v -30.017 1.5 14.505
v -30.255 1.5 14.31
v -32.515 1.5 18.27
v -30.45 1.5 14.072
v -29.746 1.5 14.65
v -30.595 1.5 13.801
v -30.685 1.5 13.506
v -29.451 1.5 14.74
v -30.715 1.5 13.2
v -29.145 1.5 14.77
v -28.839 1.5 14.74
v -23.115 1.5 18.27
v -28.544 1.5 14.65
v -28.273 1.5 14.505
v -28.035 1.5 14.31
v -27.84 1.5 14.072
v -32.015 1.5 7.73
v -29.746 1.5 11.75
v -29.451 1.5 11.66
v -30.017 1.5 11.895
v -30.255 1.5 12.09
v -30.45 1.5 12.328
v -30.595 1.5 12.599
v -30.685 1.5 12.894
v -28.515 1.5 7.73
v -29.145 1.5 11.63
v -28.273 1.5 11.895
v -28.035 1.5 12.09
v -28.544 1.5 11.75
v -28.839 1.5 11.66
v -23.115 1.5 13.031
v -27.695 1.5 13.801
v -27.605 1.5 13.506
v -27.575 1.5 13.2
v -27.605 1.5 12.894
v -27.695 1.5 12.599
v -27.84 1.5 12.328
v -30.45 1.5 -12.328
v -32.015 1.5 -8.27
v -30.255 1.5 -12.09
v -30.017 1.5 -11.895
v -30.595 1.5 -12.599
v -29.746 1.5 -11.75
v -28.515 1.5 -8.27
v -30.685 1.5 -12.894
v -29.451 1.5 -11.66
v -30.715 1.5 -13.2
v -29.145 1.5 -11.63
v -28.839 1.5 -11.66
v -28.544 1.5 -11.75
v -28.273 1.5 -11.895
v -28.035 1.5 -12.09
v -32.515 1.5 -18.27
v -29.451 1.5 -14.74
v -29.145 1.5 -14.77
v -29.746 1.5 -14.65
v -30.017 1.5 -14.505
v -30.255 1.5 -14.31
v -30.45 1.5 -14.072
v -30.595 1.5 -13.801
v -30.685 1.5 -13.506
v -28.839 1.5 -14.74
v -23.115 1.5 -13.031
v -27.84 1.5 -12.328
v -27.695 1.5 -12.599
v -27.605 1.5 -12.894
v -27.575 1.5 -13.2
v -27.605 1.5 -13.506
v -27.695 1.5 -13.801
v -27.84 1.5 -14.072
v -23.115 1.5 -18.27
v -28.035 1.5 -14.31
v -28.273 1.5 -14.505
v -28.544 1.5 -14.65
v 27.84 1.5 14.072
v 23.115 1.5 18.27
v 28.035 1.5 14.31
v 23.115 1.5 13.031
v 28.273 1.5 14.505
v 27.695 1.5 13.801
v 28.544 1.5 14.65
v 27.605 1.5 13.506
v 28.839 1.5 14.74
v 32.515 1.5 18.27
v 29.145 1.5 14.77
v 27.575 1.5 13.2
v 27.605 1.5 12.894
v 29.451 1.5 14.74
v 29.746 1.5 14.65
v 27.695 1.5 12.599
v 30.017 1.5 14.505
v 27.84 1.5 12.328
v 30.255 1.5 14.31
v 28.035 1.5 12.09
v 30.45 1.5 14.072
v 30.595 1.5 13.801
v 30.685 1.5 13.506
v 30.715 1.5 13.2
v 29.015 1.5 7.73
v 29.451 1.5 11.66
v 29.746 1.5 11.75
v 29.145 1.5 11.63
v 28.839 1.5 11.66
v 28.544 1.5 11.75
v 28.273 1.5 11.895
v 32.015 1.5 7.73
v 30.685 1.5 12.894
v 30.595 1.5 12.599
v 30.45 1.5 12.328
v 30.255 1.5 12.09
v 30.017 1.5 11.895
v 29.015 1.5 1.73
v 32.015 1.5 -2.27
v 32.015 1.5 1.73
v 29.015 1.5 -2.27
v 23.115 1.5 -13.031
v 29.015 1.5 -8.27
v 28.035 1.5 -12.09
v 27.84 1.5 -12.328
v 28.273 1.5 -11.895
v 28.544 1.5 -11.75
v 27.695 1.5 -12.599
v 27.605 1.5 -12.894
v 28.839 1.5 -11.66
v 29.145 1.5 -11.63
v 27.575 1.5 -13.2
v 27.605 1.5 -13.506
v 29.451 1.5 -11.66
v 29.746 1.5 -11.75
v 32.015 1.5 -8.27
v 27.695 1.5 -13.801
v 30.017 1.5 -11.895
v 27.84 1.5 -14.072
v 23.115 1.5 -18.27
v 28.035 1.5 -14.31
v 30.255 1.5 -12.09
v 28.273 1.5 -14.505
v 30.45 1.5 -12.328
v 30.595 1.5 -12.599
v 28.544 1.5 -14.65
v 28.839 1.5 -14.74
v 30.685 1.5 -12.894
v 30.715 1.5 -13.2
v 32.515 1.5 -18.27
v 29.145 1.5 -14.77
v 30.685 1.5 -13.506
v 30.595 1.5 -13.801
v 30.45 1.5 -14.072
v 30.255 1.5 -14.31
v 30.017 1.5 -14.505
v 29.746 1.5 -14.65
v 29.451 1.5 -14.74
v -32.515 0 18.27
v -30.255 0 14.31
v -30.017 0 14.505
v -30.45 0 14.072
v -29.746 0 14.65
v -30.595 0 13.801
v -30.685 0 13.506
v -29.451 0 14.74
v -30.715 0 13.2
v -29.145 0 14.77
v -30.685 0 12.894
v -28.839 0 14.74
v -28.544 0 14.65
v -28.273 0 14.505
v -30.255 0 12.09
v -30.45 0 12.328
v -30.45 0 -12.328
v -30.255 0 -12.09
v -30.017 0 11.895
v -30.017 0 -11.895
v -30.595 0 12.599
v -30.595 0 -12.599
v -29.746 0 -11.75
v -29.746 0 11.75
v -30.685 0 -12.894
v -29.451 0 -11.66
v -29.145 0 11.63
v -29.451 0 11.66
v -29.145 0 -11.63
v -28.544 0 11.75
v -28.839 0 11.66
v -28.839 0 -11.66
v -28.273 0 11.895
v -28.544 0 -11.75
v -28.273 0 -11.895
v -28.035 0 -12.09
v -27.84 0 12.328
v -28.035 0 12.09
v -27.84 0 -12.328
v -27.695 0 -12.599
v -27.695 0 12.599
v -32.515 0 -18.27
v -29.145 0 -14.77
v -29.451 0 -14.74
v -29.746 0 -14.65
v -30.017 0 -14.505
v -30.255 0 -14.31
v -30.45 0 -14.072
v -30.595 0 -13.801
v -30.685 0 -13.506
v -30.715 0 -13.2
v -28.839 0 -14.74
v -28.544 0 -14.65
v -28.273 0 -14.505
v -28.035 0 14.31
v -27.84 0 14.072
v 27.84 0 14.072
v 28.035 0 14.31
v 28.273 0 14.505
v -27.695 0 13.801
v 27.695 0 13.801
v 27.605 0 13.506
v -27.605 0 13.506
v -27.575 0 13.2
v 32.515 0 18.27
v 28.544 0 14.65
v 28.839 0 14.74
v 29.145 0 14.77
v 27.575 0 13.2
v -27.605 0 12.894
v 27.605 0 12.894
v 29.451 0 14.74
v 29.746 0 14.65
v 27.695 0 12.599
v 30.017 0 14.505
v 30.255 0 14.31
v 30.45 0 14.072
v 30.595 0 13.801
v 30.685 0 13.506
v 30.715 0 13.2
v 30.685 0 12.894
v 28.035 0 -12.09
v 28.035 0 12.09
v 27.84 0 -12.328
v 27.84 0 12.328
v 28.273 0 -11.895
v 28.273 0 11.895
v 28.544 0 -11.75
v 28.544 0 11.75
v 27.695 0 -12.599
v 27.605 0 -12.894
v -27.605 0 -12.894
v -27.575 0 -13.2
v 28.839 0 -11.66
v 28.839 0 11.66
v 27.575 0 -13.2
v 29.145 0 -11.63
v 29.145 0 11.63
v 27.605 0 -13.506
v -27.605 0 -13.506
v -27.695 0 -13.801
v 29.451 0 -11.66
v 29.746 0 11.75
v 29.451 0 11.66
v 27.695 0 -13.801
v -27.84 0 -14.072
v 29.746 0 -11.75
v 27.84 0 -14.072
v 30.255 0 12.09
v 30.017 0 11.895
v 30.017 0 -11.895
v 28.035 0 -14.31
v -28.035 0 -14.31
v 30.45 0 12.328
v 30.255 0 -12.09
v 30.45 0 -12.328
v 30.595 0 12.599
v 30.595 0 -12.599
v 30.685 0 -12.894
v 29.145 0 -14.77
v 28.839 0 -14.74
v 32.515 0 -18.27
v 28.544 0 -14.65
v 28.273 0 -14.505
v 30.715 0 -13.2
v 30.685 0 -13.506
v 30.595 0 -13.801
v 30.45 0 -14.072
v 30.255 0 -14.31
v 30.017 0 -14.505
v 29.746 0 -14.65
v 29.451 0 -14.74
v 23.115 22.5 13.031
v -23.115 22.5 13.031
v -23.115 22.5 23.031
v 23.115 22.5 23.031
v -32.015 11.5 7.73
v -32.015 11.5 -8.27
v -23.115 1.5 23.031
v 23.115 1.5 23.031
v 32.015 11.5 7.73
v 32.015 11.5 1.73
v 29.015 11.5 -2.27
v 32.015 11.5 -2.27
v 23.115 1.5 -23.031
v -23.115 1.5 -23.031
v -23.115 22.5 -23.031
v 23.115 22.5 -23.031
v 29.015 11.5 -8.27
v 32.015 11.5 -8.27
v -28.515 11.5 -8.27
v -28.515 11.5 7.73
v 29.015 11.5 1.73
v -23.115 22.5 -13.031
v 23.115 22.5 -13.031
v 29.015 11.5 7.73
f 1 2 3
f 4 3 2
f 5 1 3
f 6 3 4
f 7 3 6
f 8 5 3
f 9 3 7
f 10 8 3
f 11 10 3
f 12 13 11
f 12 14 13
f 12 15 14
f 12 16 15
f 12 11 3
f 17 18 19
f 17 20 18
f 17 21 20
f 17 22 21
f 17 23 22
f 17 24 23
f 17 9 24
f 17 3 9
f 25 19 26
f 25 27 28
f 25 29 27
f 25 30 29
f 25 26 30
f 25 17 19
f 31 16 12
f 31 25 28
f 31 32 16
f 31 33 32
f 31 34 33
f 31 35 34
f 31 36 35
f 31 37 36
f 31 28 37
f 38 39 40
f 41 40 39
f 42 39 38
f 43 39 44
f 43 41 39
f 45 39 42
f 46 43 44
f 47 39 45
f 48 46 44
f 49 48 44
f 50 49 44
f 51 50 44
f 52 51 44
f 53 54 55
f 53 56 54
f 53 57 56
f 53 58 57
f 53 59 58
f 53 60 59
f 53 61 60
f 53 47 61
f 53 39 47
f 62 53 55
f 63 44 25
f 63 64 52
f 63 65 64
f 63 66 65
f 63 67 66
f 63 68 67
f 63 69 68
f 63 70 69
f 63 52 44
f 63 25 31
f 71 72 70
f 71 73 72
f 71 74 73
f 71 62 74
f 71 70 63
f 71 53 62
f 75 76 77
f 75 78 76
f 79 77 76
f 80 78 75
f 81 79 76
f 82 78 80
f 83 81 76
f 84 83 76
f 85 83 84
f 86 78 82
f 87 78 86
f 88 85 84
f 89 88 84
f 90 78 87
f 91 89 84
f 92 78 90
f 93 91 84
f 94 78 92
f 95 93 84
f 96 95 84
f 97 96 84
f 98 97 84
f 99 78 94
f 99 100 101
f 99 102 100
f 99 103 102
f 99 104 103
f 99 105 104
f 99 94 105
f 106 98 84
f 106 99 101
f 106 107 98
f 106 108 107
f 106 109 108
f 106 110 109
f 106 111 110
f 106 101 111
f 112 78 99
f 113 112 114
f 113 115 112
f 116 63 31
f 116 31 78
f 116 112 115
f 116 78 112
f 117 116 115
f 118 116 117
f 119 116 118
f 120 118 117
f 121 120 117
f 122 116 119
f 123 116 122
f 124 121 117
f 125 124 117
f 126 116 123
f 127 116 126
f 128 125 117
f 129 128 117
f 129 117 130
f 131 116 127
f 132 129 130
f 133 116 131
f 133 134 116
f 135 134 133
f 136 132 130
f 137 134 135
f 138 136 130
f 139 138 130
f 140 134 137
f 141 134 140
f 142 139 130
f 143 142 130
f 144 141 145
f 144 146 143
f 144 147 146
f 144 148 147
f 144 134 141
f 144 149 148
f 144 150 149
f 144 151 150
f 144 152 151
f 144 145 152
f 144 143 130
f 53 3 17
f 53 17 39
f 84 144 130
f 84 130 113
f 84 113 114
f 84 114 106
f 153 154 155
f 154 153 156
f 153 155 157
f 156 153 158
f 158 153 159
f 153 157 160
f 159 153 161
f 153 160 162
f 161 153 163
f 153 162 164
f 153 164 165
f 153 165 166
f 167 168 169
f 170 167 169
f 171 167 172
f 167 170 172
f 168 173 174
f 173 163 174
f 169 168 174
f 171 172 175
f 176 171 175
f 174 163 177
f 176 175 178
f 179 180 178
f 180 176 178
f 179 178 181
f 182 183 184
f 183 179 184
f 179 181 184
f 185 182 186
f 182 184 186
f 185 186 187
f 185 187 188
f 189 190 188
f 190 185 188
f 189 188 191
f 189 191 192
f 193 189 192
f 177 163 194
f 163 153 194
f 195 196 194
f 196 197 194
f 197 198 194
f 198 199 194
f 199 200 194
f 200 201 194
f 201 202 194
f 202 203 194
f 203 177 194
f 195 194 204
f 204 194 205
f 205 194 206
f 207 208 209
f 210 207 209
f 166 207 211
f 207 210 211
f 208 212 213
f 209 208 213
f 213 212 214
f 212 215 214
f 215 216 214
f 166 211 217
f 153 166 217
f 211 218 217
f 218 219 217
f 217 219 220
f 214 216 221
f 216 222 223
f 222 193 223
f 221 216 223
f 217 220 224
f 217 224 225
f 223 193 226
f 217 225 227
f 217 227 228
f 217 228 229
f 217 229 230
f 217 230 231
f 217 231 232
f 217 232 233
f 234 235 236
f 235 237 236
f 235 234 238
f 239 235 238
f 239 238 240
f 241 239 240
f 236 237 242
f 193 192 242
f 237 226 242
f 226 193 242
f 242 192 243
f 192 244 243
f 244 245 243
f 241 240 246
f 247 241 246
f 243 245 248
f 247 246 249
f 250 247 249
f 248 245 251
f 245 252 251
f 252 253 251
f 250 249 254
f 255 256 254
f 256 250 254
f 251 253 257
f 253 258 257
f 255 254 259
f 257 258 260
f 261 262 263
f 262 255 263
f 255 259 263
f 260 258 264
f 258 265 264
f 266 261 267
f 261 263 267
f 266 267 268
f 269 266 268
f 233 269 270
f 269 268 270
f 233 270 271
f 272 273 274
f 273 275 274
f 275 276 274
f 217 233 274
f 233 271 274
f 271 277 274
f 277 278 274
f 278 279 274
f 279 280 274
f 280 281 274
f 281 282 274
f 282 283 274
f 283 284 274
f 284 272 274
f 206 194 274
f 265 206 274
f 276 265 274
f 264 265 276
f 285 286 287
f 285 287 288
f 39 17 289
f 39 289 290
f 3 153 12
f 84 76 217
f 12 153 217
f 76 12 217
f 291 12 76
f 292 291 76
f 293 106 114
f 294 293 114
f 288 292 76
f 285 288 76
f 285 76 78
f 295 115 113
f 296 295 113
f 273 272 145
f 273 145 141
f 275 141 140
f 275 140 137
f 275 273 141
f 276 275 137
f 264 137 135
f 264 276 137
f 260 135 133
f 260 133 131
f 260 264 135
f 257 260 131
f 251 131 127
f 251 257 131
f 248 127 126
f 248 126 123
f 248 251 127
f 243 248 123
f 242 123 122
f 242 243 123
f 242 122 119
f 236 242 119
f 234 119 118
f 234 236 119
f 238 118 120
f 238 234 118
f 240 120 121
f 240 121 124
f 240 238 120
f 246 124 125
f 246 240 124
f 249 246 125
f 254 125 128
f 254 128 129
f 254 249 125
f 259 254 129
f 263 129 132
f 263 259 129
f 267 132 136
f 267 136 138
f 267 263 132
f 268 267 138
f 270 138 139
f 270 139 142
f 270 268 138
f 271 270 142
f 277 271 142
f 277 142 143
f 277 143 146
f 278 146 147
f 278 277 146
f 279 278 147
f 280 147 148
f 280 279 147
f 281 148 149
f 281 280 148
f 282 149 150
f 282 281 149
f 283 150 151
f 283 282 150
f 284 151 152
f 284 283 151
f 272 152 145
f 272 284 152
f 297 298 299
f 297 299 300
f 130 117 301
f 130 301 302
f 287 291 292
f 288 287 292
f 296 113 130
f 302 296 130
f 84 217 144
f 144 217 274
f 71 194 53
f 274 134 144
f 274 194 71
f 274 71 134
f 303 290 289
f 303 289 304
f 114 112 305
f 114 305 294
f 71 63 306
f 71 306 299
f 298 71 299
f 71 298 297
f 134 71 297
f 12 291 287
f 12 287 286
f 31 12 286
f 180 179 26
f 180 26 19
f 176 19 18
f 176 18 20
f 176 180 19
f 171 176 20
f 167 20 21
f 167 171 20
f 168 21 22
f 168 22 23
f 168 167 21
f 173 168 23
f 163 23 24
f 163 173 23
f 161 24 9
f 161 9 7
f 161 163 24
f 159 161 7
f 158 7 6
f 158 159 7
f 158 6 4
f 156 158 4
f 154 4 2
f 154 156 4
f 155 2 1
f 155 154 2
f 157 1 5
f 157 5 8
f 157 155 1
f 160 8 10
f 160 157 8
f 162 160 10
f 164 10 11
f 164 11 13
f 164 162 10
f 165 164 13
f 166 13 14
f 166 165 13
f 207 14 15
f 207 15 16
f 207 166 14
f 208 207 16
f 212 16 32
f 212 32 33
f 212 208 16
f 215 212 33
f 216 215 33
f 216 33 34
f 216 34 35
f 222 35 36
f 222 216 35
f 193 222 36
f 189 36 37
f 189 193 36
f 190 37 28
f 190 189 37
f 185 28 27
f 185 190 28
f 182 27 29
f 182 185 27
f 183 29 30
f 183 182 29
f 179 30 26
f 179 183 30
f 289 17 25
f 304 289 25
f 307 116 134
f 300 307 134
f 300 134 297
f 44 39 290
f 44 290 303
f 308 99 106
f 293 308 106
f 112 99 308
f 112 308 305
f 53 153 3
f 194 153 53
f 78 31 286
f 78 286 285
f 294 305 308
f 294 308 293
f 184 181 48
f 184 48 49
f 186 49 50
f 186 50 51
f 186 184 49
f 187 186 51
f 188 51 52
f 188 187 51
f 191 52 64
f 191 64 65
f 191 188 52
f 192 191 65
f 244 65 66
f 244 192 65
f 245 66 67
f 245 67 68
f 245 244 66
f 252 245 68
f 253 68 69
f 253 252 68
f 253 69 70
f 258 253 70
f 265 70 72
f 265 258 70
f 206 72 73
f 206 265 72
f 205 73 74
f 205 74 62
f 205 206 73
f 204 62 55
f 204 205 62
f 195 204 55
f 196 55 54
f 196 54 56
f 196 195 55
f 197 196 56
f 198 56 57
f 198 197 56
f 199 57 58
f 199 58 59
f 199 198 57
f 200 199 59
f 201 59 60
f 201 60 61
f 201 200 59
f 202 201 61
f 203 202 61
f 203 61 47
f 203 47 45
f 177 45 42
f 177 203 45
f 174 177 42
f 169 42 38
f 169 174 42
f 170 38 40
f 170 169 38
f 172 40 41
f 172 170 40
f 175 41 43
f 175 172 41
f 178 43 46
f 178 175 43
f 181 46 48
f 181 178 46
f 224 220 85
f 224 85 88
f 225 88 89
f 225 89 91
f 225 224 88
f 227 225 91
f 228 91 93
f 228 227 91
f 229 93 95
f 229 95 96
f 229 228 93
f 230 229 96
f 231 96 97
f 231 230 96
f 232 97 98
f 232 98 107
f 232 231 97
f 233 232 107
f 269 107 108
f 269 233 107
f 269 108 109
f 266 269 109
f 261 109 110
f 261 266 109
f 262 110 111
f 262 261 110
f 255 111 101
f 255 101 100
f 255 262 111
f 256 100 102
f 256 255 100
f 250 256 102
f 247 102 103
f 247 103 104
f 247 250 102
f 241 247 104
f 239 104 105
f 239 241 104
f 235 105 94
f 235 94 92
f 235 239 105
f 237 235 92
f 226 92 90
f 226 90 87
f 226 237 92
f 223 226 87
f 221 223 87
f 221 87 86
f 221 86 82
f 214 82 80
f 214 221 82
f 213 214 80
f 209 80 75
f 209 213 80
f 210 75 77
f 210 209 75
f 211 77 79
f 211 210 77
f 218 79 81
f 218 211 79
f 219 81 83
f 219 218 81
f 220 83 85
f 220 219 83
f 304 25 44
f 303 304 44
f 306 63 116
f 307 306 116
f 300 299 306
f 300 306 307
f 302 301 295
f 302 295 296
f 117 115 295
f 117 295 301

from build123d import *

# Parameters (mm, degrees)
SKETCH1_W           = 65.03
SKETCH1_H           = 36.54
SKETCH1_R           = 1.57
BOSS_EXTRUDE1_DEPTH = 1.5
SKETCH2_W           = 3
SKETCH2_H           = 6
SKETCH2_W_2         = 3.5
SKETCH2_H_2         = 16
BOSS_EXTRUDE2_DEPTH = 10
SKETCH3_W           = 46.23
SKETCH3_H           = 10
BOSS_EXTRUDE3_DEPTH = 21


with BuildPart() as part:
    # Sketch1 → Boss-Extrude1 (new body)
    with BuildSketch(Plane(origin=(0, 0, 0), x_dir=(1, 0, 0), z_dir=(0, 1, 0))):
        Rectangle(SKETCH1_W, SKETCH1_H)
        with Locations(Location((-29.145, 13.2, 0), (0, 0, 270))):
            Circle(SKETCH1_R, mode=Mode.SUBTRACT)
        with Locations(Location((29.145, 13.2, 0), (0, 0, 90))):
            Circle(SKETCH1_R, mode=Mode.SUBTRACT)
        with Locations(Location((29.145, -13.2, 0), (0, 0, 270))):
            Circle(SKETCH1_R, mode=Mode.SUBTRACT)
        with Locations(Location((-29.145, -13.2, 0), (0, 0, 90))):
            Circle(SKETCH1_R, mode=Mode.SUBTRACT)
    extrude(amount=BOSS_EXTRUDE1_DEPTH)

    # Sketch2 → Boss-Extrude2 (add)
    with BuildSketch(Plane(origin=(0, 1.5, 0), x_dir=(1, 0, 0), z_dir=(0, 1, 0))):
        with Locations((30.515, -4.73)):
            Rectangle(SKETCH2_W, SKETCH2_H)
        with Locations((-30.265, 0.27)):
            Rectangle(SKETCH2_W_2, SKETCH2_H_2)
        with Locations((30.515, 5.27)):
            Rectangle(SKETCH2_W, SKETCH2_H)
    extrude(amount=BOSS_EXTRUDE2_DEPTH)

    # Sketch3 → Boss-Extrude3 (add)
    with BuildSketch(Plane(origin=(0, 1.5, 0), x_dir=(1, 0, 0), z_dir=(0, 1, 0))):
        with Locations((0, -18.030936004)):
            Rectangle(SKETCH3_W, SKETCH3_H)
        with Locations((0, 18.030936004)):
            Rectangle(SKETCH3_W, SKETCH3_H)
    extrude(amount=BOSS_EXTRUDE3_DEPTH)


solid = part.part
